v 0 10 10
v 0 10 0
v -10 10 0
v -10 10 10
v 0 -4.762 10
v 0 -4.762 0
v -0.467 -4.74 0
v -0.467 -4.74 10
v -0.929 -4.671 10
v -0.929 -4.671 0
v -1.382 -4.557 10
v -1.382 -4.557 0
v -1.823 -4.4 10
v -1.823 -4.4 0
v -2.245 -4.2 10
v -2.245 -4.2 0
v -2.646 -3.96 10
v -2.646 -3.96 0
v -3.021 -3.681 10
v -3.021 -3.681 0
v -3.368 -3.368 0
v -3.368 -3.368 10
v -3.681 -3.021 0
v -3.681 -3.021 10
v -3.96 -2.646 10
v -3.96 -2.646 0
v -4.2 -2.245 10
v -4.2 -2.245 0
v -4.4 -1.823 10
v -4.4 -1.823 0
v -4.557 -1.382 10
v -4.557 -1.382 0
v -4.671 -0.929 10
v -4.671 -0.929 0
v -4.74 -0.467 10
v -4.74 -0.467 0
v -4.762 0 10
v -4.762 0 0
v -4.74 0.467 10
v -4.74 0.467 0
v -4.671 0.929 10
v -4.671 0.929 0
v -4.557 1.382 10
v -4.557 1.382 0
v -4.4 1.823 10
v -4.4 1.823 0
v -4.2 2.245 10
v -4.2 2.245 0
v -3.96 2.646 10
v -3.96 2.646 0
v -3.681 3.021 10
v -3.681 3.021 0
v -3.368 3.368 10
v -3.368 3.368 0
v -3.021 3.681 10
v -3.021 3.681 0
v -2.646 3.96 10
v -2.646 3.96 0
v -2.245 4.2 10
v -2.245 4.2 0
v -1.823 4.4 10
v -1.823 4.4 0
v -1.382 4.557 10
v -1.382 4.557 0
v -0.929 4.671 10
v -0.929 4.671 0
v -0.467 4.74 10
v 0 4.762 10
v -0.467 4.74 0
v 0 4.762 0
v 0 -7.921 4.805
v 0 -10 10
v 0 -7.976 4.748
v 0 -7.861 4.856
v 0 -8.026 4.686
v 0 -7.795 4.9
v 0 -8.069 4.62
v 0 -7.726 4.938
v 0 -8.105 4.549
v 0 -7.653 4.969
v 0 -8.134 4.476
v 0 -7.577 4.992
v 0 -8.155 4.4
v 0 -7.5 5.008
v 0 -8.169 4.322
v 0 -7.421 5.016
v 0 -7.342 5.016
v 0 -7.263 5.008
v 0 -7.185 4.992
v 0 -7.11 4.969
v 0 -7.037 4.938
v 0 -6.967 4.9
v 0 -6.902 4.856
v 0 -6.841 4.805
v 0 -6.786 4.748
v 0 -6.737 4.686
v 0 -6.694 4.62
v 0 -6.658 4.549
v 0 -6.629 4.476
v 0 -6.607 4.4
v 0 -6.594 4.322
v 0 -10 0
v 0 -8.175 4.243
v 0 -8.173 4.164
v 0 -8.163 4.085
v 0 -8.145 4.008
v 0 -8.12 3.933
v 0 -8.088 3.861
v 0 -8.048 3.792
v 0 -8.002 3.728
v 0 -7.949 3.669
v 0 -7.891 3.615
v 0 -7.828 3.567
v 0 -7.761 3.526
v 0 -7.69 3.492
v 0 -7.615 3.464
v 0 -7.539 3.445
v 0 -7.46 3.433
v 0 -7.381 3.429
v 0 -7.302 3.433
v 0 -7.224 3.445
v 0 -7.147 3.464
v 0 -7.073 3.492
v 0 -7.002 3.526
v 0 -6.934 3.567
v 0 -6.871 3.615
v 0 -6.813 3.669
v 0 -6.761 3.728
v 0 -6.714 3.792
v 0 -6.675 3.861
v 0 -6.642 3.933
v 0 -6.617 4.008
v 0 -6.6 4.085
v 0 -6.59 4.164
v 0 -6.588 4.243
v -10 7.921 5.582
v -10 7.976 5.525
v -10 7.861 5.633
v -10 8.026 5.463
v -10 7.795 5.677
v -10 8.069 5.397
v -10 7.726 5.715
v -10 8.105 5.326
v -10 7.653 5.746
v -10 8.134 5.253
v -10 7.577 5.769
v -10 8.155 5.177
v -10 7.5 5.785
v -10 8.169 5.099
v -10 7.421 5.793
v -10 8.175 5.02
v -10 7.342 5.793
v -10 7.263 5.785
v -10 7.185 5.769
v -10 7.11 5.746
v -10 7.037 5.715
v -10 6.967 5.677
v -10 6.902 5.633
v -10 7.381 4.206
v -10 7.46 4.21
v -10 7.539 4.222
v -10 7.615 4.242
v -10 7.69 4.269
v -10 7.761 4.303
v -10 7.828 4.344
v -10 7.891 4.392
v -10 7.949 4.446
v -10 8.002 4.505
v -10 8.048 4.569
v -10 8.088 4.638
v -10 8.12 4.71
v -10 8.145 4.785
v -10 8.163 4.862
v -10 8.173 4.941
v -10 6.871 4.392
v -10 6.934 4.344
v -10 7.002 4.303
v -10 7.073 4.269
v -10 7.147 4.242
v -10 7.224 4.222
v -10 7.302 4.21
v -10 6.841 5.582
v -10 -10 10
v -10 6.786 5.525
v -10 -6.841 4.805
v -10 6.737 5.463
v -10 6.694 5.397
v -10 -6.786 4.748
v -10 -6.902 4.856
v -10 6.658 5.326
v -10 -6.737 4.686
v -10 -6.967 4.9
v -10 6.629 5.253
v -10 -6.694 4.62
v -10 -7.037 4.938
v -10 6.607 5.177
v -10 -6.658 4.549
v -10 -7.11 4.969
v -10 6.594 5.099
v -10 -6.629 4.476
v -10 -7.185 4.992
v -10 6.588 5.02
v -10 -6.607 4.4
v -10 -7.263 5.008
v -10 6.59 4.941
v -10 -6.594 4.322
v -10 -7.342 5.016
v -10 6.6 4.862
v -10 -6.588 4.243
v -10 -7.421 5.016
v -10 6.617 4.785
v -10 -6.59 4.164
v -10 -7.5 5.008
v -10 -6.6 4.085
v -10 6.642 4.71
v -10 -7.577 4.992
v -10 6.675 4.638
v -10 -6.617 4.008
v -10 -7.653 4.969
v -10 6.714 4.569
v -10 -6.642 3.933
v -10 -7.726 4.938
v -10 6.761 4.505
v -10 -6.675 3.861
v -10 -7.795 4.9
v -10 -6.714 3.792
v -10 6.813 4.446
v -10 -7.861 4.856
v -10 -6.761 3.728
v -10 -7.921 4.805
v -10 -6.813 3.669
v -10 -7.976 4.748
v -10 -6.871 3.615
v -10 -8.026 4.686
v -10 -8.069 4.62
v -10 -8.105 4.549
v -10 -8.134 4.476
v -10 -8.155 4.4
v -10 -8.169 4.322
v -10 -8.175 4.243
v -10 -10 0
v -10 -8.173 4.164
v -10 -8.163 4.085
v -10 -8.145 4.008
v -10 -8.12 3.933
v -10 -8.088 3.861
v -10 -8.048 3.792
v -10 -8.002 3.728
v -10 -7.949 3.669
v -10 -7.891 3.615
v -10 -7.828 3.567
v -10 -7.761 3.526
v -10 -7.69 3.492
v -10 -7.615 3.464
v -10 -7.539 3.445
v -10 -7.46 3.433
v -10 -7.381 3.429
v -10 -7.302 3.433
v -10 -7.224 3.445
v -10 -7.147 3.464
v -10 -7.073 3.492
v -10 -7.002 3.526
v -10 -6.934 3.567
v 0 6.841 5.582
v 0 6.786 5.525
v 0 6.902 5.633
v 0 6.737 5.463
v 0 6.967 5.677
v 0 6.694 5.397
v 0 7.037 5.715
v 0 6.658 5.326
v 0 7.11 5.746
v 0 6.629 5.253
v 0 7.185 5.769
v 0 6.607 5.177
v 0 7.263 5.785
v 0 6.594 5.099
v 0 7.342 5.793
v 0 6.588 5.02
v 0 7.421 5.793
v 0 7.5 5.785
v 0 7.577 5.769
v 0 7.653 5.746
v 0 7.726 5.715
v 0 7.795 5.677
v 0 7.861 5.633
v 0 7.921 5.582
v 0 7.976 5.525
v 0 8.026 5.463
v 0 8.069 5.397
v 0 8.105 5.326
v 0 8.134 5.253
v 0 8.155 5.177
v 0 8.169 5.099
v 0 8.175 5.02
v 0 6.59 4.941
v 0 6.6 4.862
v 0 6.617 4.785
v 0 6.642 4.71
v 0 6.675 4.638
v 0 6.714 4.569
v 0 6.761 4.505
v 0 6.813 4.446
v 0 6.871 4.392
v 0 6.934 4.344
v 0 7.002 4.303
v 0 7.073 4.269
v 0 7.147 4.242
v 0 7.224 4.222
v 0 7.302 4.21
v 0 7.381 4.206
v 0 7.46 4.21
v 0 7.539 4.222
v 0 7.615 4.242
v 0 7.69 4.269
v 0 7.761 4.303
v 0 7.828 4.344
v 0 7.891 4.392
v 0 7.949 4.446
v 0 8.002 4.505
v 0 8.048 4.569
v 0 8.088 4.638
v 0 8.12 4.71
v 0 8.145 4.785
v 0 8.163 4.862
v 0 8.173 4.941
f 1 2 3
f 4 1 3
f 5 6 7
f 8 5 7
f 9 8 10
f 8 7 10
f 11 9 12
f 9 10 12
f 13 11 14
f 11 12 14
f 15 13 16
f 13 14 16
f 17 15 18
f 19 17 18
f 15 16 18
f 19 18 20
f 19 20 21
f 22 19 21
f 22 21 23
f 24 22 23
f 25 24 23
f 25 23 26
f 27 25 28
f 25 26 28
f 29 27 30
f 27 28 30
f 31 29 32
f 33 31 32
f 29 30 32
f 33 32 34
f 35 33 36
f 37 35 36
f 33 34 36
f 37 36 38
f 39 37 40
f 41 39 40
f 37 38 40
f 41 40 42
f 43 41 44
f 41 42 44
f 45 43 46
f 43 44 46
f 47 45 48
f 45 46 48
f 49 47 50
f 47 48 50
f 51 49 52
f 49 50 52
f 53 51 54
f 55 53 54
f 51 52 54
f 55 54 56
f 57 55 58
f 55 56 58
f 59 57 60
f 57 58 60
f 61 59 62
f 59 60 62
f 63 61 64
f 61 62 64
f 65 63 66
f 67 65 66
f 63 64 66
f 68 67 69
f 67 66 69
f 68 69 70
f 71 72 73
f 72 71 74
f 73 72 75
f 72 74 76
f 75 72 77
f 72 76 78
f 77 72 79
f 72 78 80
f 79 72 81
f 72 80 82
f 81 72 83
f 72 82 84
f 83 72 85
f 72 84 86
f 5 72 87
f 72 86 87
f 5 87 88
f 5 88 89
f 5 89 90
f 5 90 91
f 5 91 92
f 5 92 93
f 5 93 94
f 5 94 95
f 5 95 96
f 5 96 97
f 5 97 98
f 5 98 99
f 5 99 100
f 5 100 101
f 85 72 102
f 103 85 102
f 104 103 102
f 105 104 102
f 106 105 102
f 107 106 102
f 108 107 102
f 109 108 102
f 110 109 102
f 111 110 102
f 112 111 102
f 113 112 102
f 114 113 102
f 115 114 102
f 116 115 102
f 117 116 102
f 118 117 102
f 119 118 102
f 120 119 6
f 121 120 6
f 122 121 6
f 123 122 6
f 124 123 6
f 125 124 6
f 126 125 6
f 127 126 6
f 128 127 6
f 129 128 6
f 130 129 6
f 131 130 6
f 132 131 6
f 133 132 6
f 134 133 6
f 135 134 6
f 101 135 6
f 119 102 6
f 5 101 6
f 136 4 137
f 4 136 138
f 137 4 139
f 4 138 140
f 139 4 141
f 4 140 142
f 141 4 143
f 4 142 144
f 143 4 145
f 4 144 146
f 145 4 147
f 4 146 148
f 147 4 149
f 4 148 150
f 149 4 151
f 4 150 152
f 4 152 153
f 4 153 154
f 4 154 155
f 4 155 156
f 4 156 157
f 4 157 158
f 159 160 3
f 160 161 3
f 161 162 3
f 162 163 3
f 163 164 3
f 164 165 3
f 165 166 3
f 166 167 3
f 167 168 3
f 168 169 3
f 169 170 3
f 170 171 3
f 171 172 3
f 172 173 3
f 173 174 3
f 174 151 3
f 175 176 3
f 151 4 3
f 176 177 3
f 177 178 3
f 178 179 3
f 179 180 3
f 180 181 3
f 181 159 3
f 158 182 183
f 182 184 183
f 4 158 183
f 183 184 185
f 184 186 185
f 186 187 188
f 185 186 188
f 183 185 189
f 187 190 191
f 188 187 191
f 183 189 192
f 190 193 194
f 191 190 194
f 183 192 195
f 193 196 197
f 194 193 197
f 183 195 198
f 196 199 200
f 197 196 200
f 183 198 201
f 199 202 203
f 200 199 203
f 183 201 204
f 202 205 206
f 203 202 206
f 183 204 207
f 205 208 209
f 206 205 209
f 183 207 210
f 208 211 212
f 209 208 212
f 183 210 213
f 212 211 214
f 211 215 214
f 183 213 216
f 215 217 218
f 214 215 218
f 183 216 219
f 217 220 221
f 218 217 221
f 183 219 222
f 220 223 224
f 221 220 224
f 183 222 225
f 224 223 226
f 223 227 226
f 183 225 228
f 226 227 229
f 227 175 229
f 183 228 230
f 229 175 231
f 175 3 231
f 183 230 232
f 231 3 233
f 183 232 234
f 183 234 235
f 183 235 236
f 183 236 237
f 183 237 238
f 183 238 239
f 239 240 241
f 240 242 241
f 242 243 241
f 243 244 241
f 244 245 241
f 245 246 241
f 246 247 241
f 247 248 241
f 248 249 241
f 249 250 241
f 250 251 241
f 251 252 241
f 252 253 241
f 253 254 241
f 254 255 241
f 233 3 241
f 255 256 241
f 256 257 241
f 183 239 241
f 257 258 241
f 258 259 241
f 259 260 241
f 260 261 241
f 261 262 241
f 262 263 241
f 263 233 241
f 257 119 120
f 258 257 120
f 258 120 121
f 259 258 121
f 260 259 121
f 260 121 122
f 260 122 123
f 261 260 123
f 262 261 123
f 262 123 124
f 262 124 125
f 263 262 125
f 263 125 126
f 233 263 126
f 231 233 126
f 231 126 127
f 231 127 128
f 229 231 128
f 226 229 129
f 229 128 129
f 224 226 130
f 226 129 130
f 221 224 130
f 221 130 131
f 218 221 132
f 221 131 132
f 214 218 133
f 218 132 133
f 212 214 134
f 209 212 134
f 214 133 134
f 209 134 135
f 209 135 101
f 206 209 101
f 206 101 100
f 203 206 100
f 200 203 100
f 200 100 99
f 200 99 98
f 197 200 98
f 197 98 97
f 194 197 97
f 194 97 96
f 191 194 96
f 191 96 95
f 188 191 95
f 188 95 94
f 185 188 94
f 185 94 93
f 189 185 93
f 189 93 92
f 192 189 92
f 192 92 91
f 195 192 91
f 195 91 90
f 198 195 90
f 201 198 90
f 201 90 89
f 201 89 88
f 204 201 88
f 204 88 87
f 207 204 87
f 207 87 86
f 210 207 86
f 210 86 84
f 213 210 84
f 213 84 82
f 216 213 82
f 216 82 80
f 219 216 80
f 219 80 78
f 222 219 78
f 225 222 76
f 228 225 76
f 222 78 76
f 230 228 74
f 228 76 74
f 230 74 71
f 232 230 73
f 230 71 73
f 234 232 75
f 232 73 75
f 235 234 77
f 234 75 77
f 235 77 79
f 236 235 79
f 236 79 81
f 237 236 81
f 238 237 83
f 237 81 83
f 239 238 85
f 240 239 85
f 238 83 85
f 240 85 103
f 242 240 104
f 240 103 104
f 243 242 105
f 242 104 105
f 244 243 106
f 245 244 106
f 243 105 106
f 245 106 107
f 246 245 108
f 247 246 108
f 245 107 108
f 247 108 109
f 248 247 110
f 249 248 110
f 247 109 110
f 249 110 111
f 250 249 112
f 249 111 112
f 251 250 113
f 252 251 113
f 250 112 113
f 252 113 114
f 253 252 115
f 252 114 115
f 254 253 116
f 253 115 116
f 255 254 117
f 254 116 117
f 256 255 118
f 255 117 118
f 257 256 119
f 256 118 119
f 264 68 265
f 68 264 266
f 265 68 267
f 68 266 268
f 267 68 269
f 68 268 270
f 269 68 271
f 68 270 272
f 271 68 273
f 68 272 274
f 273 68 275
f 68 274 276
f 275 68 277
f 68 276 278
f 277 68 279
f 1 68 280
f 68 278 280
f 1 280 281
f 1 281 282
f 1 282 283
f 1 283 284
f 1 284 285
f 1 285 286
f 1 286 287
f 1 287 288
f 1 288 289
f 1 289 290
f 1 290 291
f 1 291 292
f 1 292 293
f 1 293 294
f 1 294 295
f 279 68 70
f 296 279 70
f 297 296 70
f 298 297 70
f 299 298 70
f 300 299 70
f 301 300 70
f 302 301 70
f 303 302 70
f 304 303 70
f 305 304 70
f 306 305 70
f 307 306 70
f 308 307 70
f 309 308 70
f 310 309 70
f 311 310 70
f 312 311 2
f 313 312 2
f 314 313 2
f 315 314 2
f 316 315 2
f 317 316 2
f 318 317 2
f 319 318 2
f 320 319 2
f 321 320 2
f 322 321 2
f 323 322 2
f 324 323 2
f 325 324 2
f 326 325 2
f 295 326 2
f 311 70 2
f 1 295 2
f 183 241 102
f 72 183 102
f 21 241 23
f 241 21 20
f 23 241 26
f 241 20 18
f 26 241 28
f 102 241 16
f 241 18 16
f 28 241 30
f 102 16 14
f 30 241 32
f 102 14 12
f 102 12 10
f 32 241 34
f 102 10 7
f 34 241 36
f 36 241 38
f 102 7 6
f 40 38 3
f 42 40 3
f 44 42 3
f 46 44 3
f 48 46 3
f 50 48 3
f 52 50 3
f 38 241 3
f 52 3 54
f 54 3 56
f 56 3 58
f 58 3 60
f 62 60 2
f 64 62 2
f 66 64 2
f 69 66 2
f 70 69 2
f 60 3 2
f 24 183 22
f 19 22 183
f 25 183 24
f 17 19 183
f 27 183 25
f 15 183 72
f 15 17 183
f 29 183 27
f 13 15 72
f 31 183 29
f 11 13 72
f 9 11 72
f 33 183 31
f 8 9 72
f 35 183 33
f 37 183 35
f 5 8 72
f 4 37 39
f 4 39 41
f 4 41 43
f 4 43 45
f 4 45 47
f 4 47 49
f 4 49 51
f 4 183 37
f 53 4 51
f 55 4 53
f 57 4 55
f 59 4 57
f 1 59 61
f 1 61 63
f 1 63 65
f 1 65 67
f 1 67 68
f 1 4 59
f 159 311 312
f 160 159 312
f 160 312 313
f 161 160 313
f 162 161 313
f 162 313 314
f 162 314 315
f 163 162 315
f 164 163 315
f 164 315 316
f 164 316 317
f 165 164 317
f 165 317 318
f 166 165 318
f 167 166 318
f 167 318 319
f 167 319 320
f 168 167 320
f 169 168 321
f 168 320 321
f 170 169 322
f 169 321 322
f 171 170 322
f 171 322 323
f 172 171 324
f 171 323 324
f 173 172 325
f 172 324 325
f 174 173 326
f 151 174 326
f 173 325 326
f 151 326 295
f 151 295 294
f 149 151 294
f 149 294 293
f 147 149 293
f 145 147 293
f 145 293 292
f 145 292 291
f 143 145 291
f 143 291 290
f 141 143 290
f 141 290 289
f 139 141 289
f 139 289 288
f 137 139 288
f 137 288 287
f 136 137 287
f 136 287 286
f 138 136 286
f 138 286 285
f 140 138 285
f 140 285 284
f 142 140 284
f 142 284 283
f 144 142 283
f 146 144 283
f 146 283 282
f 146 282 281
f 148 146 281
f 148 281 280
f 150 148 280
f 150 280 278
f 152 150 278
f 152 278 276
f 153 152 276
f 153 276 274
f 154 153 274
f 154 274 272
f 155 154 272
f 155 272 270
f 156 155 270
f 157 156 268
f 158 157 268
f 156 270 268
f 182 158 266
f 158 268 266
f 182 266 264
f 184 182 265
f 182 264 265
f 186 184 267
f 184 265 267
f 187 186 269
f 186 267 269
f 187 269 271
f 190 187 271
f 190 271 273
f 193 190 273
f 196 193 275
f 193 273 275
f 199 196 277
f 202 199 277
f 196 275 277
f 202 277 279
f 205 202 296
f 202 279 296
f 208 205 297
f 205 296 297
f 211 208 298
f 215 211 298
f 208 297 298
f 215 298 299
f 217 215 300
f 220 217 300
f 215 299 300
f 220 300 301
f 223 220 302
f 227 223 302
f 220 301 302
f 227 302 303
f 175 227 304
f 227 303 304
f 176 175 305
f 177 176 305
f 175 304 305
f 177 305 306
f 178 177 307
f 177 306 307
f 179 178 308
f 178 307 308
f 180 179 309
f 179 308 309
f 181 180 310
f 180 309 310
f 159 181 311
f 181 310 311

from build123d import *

# Parameters (mm, degrees)
EXTRUDE_1_DEPTH     = 10
SKETCH_2_R          = 0.79375
CUT_EXTRUDE_1_DEPTH = 18.320508076


with BuildPart() as part:
    # 草图1 → 凸台-拉伸1 (new body)
    with BuildSketch(Plane.XY):
        with BuildLine():
            Line((0, 4.7625), (0, 10))
            Line((0, 10), (-10, 10))
            Line((-10, 10), (-10, -10))
            Line((-10, -10), (0, -10))
            Line((0, -10), (0, -4.7625))
            ThreePointArc((0, -4.7625), (-4.7625, 0), (0, 4.7625))
        make_face()
    extrude(amount=EXTRUDE_1_DEPTH)

    # 草图2 → 切除-拉伸1 (cut, through all)
    with BuildSketch(Plane(origin=(0, 0, 0), x_dir=(0, 0, -1), z_dir=(1, 0, 0))):
        with Locations((-5, 7.38125)):
            Circle(SKETCH_2_R)
        with Locations((-4.222922478, -7.38125)):
            Circle(SKETCH_2_R)
    extrude(amount=-CUT_EXTRUDE_1_DEPTH, mode=Mode.SUBTRACT)


solid = part.part
